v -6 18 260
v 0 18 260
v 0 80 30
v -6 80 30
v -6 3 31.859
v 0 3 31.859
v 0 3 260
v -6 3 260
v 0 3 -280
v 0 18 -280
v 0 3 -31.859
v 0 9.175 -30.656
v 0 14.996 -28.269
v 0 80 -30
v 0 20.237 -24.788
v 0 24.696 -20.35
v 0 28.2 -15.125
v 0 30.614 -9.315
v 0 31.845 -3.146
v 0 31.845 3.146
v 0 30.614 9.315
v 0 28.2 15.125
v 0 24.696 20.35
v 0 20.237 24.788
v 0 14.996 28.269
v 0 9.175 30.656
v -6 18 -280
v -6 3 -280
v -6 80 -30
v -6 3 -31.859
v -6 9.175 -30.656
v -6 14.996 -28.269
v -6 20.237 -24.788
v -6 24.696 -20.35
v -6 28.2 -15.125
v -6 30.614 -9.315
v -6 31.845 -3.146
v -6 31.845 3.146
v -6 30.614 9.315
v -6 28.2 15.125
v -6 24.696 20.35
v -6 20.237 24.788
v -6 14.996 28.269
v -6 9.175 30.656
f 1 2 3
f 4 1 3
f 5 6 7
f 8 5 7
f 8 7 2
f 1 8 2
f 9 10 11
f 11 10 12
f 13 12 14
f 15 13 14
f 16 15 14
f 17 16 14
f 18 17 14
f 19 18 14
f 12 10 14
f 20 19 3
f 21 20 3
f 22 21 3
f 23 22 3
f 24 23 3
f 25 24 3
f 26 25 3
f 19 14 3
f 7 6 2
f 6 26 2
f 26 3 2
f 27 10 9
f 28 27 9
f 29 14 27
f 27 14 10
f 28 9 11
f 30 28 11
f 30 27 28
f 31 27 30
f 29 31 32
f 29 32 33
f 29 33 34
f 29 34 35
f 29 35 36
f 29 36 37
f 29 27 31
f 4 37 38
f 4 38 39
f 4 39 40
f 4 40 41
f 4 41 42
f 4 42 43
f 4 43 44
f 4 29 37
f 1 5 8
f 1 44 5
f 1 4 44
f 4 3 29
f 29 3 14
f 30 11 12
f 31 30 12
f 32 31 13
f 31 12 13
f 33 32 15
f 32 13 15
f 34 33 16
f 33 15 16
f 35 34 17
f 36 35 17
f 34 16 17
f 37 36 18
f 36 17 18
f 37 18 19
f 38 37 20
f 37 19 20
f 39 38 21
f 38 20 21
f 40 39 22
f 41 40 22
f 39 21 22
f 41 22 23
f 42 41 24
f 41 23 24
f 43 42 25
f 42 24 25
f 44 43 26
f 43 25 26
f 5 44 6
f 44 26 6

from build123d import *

# Parameters (mm, degrees)
BASE_FLANGE1_DEPTH = 6


# Sheet-metal steps are written as plain solids
with BuildPart() as part:
    # Sketch1 → Base-Flange1 (new body)
    with BuildSketch(Plane(origin=(0, 0, 0), x_dir=(0, 0, -1), z_dir=(1, 0, 0))):
        with BuildLine():
            Line((-31.859064644, 3), (-260, 3))
            Line((-260, 3), (-260, 18))
            Line((-260, 18), (-30, 80))
            Line((-30, 80), (30, 80))
            Line((30, 80), (280, 18))
            Line((280, 18), (280, 3))
            Line((280, 3), (31.859064644, 3))
            ThreePointArc((31.859064644, 3), (0, 32), (-31.859064644, 3))
        make_face()
    extrude(amount=-BASE_FLANGE1_DEPTH)


solid = part.part
